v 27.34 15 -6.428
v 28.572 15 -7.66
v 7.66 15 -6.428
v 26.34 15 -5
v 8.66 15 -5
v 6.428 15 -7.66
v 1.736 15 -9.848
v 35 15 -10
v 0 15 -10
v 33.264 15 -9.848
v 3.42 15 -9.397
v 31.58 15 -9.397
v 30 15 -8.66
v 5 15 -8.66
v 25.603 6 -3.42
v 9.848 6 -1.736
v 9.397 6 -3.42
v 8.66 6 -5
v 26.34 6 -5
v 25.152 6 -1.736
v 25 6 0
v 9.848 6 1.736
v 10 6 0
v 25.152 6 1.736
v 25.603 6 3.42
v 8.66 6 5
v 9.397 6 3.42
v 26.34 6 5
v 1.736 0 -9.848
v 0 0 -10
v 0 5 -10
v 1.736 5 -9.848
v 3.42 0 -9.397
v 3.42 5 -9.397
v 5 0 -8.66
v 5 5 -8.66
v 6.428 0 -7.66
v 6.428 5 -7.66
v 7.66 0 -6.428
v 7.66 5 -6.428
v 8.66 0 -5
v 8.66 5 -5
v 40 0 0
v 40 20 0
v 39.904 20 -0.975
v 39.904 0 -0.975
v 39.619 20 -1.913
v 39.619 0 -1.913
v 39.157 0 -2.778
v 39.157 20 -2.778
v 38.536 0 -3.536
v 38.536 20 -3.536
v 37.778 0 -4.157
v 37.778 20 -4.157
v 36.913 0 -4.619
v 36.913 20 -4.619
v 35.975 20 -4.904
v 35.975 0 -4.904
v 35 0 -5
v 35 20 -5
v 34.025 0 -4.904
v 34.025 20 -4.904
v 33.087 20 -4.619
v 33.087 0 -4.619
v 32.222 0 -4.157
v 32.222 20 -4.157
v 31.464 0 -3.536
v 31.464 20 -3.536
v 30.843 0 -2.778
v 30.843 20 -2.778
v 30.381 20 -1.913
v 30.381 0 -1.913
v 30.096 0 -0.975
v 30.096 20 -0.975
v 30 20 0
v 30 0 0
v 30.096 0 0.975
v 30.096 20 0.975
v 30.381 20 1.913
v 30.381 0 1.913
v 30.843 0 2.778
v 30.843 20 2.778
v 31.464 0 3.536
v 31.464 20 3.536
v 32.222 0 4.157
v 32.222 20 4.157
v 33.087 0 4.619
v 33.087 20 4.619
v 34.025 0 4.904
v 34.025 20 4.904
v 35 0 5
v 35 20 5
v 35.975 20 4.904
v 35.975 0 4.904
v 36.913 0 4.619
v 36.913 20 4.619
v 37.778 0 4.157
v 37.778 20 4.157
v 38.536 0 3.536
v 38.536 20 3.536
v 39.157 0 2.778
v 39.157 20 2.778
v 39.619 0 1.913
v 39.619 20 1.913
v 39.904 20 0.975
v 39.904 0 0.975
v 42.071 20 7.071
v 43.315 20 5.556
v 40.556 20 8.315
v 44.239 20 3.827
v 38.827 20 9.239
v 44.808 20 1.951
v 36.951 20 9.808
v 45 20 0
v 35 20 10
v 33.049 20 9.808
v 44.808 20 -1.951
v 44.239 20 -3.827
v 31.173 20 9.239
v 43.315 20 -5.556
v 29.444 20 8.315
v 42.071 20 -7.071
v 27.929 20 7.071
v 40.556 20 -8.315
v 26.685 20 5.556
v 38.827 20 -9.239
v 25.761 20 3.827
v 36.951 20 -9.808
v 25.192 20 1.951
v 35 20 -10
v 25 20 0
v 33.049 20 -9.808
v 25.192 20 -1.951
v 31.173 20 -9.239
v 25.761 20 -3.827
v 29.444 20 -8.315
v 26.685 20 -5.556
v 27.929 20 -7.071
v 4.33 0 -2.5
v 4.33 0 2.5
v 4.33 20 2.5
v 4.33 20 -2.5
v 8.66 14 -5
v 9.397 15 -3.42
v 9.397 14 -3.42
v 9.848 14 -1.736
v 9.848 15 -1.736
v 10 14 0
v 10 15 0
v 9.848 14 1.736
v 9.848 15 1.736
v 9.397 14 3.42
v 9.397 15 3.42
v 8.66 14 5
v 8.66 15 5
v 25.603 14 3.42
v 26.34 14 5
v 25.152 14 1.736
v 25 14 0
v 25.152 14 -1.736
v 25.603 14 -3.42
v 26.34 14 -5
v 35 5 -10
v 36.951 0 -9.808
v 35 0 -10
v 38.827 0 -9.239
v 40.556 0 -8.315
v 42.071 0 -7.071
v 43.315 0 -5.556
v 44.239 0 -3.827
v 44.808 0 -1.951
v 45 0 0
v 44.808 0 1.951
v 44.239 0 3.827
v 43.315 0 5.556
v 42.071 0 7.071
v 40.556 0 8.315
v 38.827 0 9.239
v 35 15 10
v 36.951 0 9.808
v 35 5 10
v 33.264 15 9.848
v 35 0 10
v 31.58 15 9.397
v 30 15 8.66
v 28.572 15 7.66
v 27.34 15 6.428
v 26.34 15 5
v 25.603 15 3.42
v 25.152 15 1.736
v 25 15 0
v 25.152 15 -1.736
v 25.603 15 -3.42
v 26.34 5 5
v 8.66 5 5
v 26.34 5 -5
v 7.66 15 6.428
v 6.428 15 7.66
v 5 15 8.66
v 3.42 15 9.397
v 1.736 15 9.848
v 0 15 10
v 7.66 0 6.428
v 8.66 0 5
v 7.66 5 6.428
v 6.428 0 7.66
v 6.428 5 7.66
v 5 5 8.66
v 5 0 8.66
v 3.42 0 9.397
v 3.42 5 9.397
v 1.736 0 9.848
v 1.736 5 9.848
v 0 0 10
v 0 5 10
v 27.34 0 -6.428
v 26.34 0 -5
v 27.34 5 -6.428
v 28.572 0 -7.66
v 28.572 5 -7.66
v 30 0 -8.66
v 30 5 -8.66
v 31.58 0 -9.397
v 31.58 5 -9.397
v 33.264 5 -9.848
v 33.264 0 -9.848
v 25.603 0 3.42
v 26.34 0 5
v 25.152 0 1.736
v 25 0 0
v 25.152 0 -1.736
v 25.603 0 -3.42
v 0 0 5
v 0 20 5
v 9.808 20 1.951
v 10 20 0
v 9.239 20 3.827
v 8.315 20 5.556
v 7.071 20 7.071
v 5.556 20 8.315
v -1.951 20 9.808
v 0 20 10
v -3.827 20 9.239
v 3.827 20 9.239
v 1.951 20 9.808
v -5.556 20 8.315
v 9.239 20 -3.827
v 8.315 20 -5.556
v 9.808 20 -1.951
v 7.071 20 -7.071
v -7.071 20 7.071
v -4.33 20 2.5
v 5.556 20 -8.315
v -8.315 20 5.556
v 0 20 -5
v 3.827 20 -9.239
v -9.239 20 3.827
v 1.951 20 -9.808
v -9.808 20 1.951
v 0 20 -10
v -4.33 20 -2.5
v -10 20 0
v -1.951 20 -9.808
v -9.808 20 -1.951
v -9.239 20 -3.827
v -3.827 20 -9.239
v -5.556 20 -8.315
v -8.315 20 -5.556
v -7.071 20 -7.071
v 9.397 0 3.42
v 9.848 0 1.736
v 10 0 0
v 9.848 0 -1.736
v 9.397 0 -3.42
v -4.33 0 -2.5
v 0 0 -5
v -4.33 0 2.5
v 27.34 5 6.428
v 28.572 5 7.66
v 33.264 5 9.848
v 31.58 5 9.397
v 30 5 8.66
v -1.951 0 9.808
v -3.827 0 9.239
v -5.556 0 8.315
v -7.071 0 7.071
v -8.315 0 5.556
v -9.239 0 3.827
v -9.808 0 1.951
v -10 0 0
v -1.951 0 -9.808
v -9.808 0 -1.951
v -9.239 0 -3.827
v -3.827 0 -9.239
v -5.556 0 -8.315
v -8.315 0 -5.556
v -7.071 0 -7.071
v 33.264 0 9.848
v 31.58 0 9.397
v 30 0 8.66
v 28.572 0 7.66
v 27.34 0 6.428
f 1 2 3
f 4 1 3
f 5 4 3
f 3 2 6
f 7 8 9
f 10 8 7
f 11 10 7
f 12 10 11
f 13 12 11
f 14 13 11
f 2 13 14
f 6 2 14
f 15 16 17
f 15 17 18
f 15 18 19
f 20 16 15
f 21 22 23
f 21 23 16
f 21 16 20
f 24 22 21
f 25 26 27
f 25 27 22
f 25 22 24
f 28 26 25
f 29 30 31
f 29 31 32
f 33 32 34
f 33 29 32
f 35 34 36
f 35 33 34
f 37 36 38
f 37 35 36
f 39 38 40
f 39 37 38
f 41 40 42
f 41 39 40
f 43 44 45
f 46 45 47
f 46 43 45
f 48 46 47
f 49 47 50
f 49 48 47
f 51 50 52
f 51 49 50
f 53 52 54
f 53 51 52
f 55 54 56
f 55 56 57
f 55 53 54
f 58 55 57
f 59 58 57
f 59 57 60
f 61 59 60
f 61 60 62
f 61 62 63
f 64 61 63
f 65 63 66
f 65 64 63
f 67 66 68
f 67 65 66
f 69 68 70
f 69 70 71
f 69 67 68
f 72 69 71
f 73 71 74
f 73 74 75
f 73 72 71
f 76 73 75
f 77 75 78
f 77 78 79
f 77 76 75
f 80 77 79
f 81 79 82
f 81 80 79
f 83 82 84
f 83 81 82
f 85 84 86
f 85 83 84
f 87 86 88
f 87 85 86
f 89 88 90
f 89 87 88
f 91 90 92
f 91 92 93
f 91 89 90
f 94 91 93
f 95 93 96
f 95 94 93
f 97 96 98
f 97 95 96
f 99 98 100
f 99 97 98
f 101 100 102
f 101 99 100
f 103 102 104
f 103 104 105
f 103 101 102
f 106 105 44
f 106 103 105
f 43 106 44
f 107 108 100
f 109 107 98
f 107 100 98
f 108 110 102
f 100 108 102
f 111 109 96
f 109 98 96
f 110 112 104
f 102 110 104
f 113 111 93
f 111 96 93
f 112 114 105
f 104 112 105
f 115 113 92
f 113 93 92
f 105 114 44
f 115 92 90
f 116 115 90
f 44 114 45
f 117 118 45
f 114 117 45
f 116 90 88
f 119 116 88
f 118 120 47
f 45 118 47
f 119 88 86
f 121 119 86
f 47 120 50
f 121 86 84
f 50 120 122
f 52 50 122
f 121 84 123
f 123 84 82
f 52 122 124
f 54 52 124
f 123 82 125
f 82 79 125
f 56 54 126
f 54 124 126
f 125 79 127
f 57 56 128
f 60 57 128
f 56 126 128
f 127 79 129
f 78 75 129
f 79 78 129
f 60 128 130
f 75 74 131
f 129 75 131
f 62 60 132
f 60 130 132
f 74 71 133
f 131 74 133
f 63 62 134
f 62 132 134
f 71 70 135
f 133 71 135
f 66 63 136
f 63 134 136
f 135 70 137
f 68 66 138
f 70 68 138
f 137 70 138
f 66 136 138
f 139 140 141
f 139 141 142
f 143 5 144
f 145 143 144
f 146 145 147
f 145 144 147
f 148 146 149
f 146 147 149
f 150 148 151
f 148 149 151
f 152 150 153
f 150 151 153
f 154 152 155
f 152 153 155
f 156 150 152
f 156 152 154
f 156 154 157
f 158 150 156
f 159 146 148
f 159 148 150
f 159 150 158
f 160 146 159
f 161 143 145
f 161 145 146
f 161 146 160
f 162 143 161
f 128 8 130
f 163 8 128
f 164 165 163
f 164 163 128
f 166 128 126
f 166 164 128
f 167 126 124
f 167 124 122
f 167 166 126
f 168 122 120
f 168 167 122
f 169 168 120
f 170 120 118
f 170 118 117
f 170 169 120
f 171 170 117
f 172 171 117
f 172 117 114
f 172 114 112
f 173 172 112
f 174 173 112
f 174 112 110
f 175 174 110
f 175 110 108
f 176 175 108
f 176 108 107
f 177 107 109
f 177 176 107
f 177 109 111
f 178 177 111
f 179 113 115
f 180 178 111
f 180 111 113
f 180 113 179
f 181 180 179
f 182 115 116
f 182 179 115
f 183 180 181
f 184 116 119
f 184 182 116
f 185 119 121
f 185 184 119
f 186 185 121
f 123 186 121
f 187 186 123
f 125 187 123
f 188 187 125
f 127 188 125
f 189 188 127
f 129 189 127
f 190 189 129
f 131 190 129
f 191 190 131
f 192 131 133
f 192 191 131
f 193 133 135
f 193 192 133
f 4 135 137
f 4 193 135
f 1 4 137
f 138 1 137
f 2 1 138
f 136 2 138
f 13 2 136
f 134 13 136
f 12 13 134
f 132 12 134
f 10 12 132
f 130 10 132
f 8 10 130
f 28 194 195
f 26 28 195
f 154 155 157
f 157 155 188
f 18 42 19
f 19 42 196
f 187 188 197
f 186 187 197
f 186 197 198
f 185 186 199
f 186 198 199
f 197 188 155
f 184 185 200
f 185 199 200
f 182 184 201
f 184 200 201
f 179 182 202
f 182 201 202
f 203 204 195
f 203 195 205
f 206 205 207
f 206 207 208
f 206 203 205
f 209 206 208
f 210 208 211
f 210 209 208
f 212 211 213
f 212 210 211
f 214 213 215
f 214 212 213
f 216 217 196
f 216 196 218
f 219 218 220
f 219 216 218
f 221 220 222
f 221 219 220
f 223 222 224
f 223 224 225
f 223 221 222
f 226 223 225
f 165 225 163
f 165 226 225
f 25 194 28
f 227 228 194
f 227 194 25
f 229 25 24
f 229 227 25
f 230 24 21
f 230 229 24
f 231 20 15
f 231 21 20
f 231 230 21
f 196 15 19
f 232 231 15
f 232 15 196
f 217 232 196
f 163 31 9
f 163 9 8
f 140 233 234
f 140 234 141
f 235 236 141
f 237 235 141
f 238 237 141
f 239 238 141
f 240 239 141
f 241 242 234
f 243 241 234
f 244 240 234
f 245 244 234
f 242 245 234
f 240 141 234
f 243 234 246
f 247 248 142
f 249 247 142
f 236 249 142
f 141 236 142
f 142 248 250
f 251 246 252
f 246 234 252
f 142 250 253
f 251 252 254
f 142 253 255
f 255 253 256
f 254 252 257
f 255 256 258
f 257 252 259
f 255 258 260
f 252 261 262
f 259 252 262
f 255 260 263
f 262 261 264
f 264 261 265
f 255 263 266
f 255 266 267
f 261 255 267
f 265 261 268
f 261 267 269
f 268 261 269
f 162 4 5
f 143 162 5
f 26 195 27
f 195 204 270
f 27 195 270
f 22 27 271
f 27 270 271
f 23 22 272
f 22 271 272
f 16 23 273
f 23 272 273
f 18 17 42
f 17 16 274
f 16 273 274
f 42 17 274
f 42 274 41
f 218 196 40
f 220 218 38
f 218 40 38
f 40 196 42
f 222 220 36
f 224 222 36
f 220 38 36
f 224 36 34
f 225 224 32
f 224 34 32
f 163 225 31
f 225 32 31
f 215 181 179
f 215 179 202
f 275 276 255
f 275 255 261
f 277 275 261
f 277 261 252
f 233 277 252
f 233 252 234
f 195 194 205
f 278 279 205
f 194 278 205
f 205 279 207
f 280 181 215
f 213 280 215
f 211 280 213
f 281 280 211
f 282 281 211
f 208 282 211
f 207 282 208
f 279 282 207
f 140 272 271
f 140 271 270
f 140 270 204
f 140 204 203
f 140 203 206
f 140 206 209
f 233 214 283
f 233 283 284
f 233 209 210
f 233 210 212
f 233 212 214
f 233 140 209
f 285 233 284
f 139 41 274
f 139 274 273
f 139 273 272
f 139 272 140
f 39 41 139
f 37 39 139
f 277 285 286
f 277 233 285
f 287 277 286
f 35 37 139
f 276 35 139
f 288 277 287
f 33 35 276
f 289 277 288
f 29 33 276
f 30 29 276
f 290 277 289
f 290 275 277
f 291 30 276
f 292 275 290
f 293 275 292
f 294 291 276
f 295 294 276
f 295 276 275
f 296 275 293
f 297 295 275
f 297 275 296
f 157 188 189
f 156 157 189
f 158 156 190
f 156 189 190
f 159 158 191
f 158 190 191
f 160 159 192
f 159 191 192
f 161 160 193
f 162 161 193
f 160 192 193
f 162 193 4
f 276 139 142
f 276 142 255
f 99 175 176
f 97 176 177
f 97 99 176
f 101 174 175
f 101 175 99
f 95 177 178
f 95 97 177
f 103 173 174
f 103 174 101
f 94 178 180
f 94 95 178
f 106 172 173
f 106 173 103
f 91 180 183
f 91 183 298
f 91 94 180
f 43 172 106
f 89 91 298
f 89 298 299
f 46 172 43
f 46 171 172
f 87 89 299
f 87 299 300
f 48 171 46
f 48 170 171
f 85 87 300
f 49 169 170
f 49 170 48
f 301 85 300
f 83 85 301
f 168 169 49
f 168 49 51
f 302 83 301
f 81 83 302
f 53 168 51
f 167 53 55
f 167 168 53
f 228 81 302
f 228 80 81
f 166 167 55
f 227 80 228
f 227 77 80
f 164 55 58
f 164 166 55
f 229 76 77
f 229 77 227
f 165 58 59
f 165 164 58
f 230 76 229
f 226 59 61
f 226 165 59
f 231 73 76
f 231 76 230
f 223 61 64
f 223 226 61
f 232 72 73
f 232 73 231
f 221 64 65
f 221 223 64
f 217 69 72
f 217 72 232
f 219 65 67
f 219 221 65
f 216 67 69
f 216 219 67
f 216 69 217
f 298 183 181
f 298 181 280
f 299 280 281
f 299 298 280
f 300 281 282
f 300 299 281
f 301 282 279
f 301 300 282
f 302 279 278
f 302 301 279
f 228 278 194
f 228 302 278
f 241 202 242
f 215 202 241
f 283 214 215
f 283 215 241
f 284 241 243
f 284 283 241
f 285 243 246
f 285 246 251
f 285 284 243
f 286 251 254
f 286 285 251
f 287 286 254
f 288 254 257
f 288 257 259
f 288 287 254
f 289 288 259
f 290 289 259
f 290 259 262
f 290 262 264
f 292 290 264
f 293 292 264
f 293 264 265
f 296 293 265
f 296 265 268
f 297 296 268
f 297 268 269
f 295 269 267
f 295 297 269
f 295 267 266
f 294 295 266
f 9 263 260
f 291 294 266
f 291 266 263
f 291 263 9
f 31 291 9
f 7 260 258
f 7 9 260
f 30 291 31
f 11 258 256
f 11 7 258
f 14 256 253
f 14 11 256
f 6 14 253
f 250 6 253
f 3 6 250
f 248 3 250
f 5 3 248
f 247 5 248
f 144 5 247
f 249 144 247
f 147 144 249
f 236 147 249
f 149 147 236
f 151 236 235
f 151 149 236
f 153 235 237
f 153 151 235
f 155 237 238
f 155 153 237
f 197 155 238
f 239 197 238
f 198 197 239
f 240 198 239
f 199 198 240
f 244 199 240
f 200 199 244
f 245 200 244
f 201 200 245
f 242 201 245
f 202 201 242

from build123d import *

# Parameters (mm, degrees)
SKETCH1_R           = 5
BOSS_EXTRUDE1_DEPTH = 20
CUT_EXTRUDE2_DEPTH  = 5
CUT_EXTRUDE3_DEPTH  = 1
CUT_EXTRUDE4_DEPTH  = 5
CUT_EXTRUDE5_DEPTH  = 1


with BuildPart() as part:
    # Sketch1 → Boss-Extrude1 (new body)
    with BuildSketch(Plane(origin=(0, 0, 0), x_dir=(1, 0, 0), z_dir=(0, 1, 0))):
        with BuildLine():
            Line((0, 10), (35, 10))
            ThreePointArc((35, 10), (45, 0), (35, -10))
            Line((35, -10), (0, -10))
            ThreePointArc((0, -10), (-10, 0), (0, 10))
        make_face()
        with Locations((35, 0)):
            Circle(SKETCH1_R, mode=Mode.SUBTRACT)
        Polygon((0, 5), (-4.330127, 2.5), (-4.330127, -2.5), (0, -5), (4.330127, -2.5), (4.330127, 2.5), align=None, mode=Mode.SUBTRACT)
    extrude(amount=BOSS_EXTRUDE1_DEPTH)

    # Sketch2 → Cut-Extrude2 (cut)
    with BuildSketch(Plane(origin=(0, 20, 0), x_dir=(1, 0, 0), z_dir=(0, 1, 0))):
        with BuildLine():
            Line((0, 10), (35, 10))
            ThreePointArc((35, 10), (25, 0), (35, -10))
            Line((35, -10), (0, -10))
            ThreePointArc((0, -10), (10, 0), (0, 10))
        make_face()
    extrude(amount=-CUT_EXTRUDE2_DEPTH, mode=Mode.SUBTRACT)

    # Sketch3 → Cut-Extrude3 (cut)
    with BuildSketch(Plane(origin=(0, 15, 0), x_dir=(1, 0, 0), z_dir=(0, 1, 0))):
        with BuildLine():
            Line((26.339746, 5), (8.660254, 5))
            ThreePointArc((8.660254, 5), (10, 0), (8.660254, -5))
            Line((8.660254, -5), (26.339746, -5))
            ThreePointArc((26.339746, -5), (25, 0), (26.339746, 5))
        make_face()
    extrude(amount=-CUT_EXTRUDE3_DEPTH, mode=Mode.SUBTRACT)

    # Sketch4 → Cut-Extrude4 (cut)
    with BuildSketch(Plane.XZ):
        with BuildLine():
            ThreePointArc((0, -10), (5, -8.660254), (8.660254, -5))
            ThreePointArc((8.660254, -5), (10, 0), (8.660254, 5))
            ThreePointArc((8.660254, 5), (5, 8.660254), (0, 10))
            Line((0, 10), (35, 10))
            ThreePointArc((35, 10), (30, 8.660254), (26.339746, 5))
            ThreePointArc((26.339746, 5), (25, 0), (26.339746, -5))
            ThreePointArc((26.339746, -5), (30, -8.660254), (35, -10))
            Line((35, -10), (0, -10))
        make_face()
    extrude(amount=-CUT_EXTRUDE4_DEPTH, mode=Mode.SUBTRACT)

    # Sketch5 → Cut-Extrude5 (cut)
    with BuildSketch(Plane.XZ.offset(-5)):
        with BuildLine():
            ThreePointArc((8.660254, 5), (10, 0), (8.660254, -5))
            Line((8.660254, -5), (26.339746, -5))
            ThreePointArc((26.339746, -5), (25, 0), (26.339746, 5))
            Line((26.339746, 5), (8.660254, 5))
        make_face()
    extrude(amount=-CUT_EXTRUDE5_DEPTH, mode=Mode.SUBTRACT)


solid = part.part
